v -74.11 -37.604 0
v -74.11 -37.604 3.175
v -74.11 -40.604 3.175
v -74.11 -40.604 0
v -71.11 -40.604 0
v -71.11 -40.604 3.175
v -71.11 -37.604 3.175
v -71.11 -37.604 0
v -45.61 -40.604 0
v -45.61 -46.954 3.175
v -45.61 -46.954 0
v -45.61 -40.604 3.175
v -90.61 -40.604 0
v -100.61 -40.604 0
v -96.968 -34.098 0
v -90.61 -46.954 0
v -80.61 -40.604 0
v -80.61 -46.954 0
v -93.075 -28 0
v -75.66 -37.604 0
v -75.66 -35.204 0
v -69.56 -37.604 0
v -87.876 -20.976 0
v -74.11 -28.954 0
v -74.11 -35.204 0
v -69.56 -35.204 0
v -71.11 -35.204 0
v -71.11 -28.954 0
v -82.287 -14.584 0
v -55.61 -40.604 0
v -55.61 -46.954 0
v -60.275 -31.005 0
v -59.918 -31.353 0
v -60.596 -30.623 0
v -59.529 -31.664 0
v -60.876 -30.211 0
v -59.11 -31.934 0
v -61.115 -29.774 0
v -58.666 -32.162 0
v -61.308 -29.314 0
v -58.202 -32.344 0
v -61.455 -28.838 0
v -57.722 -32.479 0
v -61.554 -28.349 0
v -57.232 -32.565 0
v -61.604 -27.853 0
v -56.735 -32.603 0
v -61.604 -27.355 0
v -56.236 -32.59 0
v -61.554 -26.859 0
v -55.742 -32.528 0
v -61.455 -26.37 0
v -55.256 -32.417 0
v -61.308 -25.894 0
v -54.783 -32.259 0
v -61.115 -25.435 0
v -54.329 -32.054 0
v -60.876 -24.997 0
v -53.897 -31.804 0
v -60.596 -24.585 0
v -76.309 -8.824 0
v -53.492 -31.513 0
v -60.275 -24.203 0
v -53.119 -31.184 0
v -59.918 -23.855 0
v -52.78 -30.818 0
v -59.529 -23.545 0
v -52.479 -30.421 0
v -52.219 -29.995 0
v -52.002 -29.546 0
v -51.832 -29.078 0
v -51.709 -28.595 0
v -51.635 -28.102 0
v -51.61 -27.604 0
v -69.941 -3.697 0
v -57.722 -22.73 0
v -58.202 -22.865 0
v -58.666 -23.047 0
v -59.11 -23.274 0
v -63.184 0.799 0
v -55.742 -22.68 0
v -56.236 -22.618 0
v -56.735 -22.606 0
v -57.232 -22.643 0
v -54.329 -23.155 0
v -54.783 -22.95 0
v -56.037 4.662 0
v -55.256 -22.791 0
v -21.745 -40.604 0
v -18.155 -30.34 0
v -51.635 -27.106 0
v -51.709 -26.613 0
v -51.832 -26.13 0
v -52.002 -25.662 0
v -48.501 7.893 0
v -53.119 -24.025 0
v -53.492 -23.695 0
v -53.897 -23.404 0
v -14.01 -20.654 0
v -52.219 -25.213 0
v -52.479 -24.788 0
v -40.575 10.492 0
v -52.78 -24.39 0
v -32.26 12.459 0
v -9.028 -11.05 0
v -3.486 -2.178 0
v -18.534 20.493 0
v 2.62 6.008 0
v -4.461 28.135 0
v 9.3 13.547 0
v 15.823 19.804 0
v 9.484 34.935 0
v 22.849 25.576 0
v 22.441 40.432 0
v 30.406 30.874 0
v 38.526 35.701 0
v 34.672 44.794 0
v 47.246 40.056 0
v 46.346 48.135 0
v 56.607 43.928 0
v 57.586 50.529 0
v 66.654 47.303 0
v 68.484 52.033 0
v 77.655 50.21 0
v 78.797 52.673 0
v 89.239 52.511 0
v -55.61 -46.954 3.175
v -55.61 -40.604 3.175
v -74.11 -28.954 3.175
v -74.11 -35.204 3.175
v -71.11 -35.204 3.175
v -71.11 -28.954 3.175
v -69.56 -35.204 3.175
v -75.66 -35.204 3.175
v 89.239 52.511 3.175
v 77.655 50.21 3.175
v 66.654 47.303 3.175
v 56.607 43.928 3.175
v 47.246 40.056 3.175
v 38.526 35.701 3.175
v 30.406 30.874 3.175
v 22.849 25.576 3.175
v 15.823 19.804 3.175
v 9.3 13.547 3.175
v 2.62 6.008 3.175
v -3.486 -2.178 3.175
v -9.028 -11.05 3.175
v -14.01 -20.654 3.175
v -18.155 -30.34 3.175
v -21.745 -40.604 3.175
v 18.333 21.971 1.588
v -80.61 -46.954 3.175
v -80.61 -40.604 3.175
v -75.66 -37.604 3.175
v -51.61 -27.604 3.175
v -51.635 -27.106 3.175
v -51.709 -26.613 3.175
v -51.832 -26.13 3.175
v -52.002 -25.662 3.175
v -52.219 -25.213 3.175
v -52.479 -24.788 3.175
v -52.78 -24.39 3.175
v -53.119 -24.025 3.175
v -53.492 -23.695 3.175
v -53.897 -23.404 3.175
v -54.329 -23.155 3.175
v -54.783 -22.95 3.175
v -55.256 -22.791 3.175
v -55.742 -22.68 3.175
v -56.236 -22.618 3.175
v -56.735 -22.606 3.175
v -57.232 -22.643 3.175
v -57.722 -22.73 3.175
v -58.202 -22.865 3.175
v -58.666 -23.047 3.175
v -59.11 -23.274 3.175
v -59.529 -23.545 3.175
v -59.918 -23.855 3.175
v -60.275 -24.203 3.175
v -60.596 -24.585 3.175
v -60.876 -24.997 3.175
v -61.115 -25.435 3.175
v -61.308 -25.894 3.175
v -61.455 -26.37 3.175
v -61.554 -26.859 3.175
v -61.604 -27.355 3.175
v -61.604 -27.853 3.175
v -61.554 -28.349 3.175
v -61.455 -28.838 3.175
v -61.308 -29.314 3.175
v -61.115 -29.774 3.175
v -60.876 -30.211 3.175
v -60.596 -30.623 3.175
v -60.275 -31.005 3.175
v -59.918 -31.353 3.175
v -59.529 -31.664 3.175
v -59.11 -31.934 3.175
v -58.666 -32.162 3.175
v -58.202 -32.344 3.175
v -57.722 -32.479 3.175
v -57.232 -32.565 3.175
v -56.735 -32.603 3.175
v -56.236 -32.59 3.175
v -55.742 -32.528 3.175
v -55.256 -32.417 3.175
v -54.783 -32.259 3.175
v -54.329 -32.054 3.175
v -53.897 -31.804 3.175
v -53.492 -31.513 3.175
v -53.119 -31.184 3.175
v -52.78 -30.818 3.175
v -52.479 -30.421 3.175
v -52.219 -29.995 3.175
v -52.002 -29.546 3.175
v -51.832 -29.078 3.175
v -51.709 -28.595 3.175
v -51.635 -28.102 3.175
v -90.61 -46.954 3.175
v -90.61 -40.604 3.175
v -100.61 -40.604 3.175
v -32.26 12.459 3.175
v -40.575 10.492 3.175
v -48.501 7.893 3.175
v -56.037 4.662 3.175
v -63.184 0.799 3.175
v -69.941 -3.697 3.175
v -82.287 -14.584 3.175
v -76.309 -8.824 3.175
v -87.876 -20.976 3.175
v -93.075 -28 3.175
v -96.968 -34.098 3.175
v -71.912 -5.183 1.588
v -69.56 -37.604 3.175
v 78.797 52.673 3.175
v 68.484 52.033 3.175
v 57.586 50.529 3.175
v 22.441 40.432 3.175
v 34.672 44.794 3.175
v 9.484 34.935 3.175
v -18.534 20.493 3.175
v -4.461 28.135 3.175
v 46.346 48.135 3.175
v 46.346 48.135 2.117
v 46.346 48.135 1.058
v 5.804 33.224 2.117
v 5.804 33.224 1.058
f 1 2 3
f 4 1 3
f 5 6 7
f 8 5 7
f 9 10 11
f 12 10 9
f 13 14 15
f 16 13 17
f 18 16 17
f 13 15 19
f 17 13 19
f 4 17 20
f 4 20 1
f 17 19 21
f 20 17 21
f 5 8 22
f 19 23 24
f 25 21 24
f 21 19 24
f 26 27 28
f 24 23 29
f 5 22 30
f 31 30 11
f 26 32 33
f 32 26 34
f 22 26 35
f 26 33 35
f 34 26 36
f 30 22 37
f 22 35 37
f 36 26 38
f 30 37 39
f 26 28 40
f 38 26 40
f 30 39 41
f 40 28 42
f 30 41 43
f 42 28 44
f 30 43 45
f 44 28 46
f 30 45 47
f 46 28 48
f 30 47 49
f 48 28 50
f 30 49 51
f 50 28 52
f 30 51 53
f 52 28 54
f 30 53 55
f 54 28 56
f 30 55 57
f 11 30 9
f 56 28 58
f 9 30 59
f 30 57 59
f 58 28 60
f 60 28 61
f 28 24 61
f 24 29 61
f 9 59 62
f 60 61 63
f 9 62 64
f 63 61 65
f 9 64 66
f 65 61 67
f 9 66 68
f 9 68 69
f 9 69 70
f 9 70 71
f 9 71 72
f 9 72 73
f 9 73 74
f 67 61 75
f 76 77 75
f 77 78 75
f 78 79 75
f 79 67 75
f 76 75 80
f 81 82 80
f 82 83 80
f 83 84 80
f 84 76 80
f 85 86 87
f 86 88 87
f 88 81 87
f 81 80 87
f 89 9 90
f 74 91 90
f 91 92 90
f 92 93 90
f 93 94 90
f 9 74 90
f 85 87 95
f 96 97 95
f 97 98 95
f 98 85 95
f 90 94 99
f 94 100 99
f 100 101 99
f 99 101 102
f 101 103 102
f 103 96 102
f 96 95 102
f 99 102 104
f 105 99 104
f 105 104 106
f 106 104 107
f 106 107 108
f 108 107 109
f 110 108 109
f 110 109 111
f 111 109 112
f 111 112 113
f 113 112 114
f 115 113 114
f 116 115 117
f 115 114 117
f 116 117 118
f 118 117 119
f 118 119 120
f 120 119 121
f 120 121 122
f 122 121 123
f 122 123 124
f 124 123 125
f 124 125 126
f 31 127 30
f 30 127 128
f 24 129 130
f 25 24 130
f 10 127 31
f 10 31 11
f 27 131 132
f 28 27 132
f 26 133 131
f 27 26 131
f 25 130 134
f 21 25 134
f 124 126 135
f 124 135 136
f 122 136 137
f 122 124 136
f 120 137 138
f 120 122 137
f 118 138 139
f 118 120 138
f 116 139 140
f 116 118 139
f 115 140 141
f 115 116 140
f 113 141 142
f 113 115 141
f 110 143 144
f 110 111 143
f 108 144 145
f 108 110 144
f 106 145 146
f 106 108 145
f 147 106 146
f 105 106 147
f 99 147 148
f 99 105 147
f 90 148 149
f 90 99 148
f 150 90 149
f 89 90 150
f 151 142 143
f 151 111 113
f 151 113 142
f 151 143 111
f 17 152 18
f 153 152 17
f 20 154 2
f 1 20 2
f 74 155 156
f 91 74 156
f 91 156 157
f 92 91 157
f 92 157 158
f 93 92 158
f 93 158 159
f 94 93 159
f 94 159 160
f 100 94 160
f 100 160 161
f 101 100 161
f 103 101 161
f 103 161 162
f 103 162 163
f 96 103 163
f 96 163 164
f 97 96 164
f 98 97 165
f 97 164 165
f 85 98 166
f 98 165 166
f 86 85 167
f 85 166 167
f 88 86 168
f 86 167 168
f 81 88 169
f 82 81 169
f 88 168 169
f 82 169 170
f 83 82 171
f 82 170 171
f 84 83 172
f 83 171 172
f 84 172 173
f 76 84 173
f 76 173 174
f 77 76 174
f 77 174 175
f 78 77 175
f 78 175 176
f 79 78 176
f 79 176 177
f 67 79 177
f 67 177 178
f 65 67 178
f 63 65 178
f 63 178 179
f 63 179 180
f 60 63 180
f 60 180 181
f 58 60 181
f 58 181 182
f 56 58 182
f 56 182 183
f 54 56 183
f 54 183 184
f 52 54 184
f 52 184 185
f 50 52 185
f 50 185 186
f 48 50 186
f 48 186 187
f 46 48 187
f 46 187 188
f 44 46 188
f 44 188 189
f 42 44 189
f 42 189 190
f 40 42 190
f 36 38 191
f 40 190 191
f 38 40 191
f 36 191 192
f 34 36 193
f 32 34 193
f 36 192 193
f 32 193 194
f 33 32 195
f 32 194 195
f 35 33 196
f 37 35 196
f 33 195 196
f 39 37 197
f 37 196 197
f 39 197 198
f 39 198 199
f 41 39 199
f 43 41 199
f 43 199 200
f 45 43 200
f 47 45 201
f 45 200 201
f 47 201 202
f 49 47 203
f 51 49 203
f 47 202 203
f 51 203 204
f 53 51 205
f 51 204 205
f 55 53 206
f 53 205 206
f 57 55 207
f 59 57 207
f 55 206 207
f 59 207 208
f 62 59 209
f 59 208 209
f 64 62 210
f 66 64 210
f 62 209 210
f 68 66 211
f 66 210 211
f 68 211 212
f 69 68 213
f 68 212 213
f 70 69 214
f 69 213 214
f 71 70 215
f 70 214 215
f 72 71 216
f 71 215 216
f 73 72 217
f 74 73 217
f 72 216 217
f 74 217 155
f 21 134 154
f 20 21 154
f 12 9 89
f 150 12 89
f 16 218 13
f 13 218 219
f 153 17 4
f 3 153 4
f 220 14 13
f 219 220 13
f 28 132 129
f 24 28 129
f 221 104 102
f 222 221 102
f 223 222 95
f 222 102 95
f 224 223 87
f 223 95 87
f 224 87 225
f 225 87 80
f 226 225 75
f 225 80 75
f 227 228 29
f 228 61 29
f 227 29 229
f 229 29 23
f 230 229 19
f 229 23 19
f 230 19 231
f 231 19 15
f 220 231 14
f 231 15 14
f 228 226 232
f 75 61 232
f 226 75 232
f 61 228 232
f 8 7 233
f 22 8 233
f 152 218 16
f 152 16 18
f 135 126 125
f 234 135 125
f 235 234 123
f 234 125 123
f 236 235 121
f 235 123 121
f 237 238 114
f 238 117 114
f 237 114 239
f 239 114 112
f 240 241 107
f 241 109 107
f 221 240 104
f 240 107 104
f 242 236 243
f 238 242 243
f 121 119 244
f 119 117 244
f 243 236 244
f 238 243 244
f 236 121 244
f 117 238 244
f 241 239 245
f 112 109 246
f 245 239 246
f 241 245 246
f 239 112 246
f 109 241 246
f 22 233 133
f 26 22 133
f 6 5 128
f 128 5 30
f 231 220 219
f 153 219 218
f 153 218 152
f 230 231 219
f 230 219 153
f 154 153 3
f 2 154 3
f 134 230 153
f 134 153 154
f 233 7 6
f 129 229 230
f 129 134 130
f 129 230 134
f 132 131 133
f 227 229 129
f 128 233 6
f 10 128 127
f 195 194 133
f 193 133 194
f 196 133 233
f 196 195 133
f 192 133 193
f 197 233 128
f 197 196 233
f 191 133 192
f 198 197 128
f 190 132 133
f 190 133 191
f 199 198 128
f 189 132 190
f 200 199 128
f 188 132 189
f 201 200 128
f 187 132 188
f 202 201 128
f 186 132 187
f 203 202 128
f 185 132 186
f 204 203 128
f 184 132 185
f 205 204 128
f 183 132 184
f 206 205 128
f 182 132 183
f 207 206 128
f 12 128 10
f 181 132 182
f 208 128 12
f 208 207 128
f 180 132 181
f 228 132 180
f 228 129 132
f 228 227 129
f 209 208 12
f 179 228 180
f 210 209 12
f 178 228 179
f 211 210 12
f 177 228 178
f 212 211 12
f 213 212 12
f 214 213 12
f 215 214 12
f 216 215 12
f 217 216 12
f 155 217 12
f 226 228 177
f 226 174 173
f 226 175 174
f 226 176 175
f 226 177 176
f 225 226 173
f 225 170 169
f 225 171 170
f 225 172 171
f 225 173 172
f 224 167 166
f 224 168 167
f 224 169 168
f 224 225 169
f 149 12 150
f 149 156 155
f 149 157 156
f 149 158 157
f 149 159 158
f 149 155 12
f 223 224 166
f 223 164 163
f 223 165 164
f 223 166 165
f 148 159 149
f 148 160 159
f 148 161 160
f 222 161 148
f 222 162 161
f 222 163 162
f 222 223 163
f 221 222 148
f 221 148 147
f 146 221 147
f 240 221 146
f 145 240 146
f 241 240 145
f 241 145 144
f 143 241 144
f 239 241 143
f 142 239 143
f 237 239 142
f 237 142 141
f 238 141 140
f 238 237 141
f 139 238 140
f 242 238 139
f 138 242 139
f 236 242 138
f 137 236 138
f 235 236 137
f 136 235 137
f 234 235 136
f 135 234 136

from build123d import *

# Parameters (mm, degrees)
BOSS_EXTRUDE1_DEPTH = 3.175
SKETCH3_W           = 10
SKETCH3_H           = 6.35
BOSS_EXTRUDE2_DEPTH = 3.175
SKETCH4_R           = 5
CUT_EXTRUDE1_DEPTH  = 114.626458313
CUT_EXTRUDE2_DEPTH  = 114.626458313


with BuildPart() as part:
    # Sketch2 → Boss-Extrude1 (new body)
    with BuildSketch(Plane.XY):
        with BuildLine():
            Line((-100.609869354, -40.604219784), (-21.744841678, -40.604219784))
            add(Edge.make_bspline(
                [(89.238978774, 52.511300132), (2.91962202, 37.989392405), (-21.744841678, -40.604219784)],
                knots=[0, 0, 0, 1, 1, 1], degree=2))
            add(Edge.make_bspline(
                [(89.238978774, 52.511300132), (45.213595461, 54.960877806), (4.522727388, 34.592562225), (-32.259998233, 12.458533919)],
                knots=[0, 0, 0, 0, 1, 1, 1, 1], degree=3))
            add(Edge.make_bspline(
                [(-32.259998233, 12.458533919), (-77.388125592, 3.705886884), (-100.609869354, -40.604219784)],
                knots=[0, 0, 0, 1, 1, 1], degree=2))
        make_face()
    extrude(amount=BOSS_EXTRUDE1_DEPTH)

    # Sketch3 → Boss-Extrude2 (add)
    with BuildSketch(Plane.XY.offset(3.175)):
        with Locations((-85.609869354, -43.779219784)):
            Rectangle(SKETCH3_W, SKETCH3_H)
        with Locations((-50.609869354, -43.779219784)):
            Rectangle(SKETCH3_W, SKETCH3_H)
    extrude(amount=-BOSS_EXTRUDE2_DEPTH)

    # Sketch4 → Cut-Extrude1 (cut, through all)
    with BuildSketch(Plane.XY.offset(3.175)):
        with Locations((-56.609869354, -27.604219784)):
            Circle(SKETCH4_R)
    extrude(amount=-CUT_EXTRUDE1_DEPTH, mode=Mode.SUBTRACT)

    # Sketch5 → Cut-Extrude2 (cut, through all)
    with BuildSketch(Plane.XY.offset(3.175)):
        Polygon((-74.109869354, -37.604219784), (-74.109869354, -40.604219784), (-71.109869354, -40.604219784), (-71.109869354, -37.604219784), (-69.559869354, -37.604219784), (-69.559869354, -35.204219784), (-71.109869354, -35.204219784), (-71.109869354, -28.954219784), (-74.109869354, -28.954219784), (-74.109869354, -35.204219784), (-75.659869354, -35.204219784), (-75.659869354, -37.604219784), align=None)
    extrude(amount=-CUT_EXTRUDE2_DEPTH, mode=Mode.SUBTRACT)


solid = part.part
